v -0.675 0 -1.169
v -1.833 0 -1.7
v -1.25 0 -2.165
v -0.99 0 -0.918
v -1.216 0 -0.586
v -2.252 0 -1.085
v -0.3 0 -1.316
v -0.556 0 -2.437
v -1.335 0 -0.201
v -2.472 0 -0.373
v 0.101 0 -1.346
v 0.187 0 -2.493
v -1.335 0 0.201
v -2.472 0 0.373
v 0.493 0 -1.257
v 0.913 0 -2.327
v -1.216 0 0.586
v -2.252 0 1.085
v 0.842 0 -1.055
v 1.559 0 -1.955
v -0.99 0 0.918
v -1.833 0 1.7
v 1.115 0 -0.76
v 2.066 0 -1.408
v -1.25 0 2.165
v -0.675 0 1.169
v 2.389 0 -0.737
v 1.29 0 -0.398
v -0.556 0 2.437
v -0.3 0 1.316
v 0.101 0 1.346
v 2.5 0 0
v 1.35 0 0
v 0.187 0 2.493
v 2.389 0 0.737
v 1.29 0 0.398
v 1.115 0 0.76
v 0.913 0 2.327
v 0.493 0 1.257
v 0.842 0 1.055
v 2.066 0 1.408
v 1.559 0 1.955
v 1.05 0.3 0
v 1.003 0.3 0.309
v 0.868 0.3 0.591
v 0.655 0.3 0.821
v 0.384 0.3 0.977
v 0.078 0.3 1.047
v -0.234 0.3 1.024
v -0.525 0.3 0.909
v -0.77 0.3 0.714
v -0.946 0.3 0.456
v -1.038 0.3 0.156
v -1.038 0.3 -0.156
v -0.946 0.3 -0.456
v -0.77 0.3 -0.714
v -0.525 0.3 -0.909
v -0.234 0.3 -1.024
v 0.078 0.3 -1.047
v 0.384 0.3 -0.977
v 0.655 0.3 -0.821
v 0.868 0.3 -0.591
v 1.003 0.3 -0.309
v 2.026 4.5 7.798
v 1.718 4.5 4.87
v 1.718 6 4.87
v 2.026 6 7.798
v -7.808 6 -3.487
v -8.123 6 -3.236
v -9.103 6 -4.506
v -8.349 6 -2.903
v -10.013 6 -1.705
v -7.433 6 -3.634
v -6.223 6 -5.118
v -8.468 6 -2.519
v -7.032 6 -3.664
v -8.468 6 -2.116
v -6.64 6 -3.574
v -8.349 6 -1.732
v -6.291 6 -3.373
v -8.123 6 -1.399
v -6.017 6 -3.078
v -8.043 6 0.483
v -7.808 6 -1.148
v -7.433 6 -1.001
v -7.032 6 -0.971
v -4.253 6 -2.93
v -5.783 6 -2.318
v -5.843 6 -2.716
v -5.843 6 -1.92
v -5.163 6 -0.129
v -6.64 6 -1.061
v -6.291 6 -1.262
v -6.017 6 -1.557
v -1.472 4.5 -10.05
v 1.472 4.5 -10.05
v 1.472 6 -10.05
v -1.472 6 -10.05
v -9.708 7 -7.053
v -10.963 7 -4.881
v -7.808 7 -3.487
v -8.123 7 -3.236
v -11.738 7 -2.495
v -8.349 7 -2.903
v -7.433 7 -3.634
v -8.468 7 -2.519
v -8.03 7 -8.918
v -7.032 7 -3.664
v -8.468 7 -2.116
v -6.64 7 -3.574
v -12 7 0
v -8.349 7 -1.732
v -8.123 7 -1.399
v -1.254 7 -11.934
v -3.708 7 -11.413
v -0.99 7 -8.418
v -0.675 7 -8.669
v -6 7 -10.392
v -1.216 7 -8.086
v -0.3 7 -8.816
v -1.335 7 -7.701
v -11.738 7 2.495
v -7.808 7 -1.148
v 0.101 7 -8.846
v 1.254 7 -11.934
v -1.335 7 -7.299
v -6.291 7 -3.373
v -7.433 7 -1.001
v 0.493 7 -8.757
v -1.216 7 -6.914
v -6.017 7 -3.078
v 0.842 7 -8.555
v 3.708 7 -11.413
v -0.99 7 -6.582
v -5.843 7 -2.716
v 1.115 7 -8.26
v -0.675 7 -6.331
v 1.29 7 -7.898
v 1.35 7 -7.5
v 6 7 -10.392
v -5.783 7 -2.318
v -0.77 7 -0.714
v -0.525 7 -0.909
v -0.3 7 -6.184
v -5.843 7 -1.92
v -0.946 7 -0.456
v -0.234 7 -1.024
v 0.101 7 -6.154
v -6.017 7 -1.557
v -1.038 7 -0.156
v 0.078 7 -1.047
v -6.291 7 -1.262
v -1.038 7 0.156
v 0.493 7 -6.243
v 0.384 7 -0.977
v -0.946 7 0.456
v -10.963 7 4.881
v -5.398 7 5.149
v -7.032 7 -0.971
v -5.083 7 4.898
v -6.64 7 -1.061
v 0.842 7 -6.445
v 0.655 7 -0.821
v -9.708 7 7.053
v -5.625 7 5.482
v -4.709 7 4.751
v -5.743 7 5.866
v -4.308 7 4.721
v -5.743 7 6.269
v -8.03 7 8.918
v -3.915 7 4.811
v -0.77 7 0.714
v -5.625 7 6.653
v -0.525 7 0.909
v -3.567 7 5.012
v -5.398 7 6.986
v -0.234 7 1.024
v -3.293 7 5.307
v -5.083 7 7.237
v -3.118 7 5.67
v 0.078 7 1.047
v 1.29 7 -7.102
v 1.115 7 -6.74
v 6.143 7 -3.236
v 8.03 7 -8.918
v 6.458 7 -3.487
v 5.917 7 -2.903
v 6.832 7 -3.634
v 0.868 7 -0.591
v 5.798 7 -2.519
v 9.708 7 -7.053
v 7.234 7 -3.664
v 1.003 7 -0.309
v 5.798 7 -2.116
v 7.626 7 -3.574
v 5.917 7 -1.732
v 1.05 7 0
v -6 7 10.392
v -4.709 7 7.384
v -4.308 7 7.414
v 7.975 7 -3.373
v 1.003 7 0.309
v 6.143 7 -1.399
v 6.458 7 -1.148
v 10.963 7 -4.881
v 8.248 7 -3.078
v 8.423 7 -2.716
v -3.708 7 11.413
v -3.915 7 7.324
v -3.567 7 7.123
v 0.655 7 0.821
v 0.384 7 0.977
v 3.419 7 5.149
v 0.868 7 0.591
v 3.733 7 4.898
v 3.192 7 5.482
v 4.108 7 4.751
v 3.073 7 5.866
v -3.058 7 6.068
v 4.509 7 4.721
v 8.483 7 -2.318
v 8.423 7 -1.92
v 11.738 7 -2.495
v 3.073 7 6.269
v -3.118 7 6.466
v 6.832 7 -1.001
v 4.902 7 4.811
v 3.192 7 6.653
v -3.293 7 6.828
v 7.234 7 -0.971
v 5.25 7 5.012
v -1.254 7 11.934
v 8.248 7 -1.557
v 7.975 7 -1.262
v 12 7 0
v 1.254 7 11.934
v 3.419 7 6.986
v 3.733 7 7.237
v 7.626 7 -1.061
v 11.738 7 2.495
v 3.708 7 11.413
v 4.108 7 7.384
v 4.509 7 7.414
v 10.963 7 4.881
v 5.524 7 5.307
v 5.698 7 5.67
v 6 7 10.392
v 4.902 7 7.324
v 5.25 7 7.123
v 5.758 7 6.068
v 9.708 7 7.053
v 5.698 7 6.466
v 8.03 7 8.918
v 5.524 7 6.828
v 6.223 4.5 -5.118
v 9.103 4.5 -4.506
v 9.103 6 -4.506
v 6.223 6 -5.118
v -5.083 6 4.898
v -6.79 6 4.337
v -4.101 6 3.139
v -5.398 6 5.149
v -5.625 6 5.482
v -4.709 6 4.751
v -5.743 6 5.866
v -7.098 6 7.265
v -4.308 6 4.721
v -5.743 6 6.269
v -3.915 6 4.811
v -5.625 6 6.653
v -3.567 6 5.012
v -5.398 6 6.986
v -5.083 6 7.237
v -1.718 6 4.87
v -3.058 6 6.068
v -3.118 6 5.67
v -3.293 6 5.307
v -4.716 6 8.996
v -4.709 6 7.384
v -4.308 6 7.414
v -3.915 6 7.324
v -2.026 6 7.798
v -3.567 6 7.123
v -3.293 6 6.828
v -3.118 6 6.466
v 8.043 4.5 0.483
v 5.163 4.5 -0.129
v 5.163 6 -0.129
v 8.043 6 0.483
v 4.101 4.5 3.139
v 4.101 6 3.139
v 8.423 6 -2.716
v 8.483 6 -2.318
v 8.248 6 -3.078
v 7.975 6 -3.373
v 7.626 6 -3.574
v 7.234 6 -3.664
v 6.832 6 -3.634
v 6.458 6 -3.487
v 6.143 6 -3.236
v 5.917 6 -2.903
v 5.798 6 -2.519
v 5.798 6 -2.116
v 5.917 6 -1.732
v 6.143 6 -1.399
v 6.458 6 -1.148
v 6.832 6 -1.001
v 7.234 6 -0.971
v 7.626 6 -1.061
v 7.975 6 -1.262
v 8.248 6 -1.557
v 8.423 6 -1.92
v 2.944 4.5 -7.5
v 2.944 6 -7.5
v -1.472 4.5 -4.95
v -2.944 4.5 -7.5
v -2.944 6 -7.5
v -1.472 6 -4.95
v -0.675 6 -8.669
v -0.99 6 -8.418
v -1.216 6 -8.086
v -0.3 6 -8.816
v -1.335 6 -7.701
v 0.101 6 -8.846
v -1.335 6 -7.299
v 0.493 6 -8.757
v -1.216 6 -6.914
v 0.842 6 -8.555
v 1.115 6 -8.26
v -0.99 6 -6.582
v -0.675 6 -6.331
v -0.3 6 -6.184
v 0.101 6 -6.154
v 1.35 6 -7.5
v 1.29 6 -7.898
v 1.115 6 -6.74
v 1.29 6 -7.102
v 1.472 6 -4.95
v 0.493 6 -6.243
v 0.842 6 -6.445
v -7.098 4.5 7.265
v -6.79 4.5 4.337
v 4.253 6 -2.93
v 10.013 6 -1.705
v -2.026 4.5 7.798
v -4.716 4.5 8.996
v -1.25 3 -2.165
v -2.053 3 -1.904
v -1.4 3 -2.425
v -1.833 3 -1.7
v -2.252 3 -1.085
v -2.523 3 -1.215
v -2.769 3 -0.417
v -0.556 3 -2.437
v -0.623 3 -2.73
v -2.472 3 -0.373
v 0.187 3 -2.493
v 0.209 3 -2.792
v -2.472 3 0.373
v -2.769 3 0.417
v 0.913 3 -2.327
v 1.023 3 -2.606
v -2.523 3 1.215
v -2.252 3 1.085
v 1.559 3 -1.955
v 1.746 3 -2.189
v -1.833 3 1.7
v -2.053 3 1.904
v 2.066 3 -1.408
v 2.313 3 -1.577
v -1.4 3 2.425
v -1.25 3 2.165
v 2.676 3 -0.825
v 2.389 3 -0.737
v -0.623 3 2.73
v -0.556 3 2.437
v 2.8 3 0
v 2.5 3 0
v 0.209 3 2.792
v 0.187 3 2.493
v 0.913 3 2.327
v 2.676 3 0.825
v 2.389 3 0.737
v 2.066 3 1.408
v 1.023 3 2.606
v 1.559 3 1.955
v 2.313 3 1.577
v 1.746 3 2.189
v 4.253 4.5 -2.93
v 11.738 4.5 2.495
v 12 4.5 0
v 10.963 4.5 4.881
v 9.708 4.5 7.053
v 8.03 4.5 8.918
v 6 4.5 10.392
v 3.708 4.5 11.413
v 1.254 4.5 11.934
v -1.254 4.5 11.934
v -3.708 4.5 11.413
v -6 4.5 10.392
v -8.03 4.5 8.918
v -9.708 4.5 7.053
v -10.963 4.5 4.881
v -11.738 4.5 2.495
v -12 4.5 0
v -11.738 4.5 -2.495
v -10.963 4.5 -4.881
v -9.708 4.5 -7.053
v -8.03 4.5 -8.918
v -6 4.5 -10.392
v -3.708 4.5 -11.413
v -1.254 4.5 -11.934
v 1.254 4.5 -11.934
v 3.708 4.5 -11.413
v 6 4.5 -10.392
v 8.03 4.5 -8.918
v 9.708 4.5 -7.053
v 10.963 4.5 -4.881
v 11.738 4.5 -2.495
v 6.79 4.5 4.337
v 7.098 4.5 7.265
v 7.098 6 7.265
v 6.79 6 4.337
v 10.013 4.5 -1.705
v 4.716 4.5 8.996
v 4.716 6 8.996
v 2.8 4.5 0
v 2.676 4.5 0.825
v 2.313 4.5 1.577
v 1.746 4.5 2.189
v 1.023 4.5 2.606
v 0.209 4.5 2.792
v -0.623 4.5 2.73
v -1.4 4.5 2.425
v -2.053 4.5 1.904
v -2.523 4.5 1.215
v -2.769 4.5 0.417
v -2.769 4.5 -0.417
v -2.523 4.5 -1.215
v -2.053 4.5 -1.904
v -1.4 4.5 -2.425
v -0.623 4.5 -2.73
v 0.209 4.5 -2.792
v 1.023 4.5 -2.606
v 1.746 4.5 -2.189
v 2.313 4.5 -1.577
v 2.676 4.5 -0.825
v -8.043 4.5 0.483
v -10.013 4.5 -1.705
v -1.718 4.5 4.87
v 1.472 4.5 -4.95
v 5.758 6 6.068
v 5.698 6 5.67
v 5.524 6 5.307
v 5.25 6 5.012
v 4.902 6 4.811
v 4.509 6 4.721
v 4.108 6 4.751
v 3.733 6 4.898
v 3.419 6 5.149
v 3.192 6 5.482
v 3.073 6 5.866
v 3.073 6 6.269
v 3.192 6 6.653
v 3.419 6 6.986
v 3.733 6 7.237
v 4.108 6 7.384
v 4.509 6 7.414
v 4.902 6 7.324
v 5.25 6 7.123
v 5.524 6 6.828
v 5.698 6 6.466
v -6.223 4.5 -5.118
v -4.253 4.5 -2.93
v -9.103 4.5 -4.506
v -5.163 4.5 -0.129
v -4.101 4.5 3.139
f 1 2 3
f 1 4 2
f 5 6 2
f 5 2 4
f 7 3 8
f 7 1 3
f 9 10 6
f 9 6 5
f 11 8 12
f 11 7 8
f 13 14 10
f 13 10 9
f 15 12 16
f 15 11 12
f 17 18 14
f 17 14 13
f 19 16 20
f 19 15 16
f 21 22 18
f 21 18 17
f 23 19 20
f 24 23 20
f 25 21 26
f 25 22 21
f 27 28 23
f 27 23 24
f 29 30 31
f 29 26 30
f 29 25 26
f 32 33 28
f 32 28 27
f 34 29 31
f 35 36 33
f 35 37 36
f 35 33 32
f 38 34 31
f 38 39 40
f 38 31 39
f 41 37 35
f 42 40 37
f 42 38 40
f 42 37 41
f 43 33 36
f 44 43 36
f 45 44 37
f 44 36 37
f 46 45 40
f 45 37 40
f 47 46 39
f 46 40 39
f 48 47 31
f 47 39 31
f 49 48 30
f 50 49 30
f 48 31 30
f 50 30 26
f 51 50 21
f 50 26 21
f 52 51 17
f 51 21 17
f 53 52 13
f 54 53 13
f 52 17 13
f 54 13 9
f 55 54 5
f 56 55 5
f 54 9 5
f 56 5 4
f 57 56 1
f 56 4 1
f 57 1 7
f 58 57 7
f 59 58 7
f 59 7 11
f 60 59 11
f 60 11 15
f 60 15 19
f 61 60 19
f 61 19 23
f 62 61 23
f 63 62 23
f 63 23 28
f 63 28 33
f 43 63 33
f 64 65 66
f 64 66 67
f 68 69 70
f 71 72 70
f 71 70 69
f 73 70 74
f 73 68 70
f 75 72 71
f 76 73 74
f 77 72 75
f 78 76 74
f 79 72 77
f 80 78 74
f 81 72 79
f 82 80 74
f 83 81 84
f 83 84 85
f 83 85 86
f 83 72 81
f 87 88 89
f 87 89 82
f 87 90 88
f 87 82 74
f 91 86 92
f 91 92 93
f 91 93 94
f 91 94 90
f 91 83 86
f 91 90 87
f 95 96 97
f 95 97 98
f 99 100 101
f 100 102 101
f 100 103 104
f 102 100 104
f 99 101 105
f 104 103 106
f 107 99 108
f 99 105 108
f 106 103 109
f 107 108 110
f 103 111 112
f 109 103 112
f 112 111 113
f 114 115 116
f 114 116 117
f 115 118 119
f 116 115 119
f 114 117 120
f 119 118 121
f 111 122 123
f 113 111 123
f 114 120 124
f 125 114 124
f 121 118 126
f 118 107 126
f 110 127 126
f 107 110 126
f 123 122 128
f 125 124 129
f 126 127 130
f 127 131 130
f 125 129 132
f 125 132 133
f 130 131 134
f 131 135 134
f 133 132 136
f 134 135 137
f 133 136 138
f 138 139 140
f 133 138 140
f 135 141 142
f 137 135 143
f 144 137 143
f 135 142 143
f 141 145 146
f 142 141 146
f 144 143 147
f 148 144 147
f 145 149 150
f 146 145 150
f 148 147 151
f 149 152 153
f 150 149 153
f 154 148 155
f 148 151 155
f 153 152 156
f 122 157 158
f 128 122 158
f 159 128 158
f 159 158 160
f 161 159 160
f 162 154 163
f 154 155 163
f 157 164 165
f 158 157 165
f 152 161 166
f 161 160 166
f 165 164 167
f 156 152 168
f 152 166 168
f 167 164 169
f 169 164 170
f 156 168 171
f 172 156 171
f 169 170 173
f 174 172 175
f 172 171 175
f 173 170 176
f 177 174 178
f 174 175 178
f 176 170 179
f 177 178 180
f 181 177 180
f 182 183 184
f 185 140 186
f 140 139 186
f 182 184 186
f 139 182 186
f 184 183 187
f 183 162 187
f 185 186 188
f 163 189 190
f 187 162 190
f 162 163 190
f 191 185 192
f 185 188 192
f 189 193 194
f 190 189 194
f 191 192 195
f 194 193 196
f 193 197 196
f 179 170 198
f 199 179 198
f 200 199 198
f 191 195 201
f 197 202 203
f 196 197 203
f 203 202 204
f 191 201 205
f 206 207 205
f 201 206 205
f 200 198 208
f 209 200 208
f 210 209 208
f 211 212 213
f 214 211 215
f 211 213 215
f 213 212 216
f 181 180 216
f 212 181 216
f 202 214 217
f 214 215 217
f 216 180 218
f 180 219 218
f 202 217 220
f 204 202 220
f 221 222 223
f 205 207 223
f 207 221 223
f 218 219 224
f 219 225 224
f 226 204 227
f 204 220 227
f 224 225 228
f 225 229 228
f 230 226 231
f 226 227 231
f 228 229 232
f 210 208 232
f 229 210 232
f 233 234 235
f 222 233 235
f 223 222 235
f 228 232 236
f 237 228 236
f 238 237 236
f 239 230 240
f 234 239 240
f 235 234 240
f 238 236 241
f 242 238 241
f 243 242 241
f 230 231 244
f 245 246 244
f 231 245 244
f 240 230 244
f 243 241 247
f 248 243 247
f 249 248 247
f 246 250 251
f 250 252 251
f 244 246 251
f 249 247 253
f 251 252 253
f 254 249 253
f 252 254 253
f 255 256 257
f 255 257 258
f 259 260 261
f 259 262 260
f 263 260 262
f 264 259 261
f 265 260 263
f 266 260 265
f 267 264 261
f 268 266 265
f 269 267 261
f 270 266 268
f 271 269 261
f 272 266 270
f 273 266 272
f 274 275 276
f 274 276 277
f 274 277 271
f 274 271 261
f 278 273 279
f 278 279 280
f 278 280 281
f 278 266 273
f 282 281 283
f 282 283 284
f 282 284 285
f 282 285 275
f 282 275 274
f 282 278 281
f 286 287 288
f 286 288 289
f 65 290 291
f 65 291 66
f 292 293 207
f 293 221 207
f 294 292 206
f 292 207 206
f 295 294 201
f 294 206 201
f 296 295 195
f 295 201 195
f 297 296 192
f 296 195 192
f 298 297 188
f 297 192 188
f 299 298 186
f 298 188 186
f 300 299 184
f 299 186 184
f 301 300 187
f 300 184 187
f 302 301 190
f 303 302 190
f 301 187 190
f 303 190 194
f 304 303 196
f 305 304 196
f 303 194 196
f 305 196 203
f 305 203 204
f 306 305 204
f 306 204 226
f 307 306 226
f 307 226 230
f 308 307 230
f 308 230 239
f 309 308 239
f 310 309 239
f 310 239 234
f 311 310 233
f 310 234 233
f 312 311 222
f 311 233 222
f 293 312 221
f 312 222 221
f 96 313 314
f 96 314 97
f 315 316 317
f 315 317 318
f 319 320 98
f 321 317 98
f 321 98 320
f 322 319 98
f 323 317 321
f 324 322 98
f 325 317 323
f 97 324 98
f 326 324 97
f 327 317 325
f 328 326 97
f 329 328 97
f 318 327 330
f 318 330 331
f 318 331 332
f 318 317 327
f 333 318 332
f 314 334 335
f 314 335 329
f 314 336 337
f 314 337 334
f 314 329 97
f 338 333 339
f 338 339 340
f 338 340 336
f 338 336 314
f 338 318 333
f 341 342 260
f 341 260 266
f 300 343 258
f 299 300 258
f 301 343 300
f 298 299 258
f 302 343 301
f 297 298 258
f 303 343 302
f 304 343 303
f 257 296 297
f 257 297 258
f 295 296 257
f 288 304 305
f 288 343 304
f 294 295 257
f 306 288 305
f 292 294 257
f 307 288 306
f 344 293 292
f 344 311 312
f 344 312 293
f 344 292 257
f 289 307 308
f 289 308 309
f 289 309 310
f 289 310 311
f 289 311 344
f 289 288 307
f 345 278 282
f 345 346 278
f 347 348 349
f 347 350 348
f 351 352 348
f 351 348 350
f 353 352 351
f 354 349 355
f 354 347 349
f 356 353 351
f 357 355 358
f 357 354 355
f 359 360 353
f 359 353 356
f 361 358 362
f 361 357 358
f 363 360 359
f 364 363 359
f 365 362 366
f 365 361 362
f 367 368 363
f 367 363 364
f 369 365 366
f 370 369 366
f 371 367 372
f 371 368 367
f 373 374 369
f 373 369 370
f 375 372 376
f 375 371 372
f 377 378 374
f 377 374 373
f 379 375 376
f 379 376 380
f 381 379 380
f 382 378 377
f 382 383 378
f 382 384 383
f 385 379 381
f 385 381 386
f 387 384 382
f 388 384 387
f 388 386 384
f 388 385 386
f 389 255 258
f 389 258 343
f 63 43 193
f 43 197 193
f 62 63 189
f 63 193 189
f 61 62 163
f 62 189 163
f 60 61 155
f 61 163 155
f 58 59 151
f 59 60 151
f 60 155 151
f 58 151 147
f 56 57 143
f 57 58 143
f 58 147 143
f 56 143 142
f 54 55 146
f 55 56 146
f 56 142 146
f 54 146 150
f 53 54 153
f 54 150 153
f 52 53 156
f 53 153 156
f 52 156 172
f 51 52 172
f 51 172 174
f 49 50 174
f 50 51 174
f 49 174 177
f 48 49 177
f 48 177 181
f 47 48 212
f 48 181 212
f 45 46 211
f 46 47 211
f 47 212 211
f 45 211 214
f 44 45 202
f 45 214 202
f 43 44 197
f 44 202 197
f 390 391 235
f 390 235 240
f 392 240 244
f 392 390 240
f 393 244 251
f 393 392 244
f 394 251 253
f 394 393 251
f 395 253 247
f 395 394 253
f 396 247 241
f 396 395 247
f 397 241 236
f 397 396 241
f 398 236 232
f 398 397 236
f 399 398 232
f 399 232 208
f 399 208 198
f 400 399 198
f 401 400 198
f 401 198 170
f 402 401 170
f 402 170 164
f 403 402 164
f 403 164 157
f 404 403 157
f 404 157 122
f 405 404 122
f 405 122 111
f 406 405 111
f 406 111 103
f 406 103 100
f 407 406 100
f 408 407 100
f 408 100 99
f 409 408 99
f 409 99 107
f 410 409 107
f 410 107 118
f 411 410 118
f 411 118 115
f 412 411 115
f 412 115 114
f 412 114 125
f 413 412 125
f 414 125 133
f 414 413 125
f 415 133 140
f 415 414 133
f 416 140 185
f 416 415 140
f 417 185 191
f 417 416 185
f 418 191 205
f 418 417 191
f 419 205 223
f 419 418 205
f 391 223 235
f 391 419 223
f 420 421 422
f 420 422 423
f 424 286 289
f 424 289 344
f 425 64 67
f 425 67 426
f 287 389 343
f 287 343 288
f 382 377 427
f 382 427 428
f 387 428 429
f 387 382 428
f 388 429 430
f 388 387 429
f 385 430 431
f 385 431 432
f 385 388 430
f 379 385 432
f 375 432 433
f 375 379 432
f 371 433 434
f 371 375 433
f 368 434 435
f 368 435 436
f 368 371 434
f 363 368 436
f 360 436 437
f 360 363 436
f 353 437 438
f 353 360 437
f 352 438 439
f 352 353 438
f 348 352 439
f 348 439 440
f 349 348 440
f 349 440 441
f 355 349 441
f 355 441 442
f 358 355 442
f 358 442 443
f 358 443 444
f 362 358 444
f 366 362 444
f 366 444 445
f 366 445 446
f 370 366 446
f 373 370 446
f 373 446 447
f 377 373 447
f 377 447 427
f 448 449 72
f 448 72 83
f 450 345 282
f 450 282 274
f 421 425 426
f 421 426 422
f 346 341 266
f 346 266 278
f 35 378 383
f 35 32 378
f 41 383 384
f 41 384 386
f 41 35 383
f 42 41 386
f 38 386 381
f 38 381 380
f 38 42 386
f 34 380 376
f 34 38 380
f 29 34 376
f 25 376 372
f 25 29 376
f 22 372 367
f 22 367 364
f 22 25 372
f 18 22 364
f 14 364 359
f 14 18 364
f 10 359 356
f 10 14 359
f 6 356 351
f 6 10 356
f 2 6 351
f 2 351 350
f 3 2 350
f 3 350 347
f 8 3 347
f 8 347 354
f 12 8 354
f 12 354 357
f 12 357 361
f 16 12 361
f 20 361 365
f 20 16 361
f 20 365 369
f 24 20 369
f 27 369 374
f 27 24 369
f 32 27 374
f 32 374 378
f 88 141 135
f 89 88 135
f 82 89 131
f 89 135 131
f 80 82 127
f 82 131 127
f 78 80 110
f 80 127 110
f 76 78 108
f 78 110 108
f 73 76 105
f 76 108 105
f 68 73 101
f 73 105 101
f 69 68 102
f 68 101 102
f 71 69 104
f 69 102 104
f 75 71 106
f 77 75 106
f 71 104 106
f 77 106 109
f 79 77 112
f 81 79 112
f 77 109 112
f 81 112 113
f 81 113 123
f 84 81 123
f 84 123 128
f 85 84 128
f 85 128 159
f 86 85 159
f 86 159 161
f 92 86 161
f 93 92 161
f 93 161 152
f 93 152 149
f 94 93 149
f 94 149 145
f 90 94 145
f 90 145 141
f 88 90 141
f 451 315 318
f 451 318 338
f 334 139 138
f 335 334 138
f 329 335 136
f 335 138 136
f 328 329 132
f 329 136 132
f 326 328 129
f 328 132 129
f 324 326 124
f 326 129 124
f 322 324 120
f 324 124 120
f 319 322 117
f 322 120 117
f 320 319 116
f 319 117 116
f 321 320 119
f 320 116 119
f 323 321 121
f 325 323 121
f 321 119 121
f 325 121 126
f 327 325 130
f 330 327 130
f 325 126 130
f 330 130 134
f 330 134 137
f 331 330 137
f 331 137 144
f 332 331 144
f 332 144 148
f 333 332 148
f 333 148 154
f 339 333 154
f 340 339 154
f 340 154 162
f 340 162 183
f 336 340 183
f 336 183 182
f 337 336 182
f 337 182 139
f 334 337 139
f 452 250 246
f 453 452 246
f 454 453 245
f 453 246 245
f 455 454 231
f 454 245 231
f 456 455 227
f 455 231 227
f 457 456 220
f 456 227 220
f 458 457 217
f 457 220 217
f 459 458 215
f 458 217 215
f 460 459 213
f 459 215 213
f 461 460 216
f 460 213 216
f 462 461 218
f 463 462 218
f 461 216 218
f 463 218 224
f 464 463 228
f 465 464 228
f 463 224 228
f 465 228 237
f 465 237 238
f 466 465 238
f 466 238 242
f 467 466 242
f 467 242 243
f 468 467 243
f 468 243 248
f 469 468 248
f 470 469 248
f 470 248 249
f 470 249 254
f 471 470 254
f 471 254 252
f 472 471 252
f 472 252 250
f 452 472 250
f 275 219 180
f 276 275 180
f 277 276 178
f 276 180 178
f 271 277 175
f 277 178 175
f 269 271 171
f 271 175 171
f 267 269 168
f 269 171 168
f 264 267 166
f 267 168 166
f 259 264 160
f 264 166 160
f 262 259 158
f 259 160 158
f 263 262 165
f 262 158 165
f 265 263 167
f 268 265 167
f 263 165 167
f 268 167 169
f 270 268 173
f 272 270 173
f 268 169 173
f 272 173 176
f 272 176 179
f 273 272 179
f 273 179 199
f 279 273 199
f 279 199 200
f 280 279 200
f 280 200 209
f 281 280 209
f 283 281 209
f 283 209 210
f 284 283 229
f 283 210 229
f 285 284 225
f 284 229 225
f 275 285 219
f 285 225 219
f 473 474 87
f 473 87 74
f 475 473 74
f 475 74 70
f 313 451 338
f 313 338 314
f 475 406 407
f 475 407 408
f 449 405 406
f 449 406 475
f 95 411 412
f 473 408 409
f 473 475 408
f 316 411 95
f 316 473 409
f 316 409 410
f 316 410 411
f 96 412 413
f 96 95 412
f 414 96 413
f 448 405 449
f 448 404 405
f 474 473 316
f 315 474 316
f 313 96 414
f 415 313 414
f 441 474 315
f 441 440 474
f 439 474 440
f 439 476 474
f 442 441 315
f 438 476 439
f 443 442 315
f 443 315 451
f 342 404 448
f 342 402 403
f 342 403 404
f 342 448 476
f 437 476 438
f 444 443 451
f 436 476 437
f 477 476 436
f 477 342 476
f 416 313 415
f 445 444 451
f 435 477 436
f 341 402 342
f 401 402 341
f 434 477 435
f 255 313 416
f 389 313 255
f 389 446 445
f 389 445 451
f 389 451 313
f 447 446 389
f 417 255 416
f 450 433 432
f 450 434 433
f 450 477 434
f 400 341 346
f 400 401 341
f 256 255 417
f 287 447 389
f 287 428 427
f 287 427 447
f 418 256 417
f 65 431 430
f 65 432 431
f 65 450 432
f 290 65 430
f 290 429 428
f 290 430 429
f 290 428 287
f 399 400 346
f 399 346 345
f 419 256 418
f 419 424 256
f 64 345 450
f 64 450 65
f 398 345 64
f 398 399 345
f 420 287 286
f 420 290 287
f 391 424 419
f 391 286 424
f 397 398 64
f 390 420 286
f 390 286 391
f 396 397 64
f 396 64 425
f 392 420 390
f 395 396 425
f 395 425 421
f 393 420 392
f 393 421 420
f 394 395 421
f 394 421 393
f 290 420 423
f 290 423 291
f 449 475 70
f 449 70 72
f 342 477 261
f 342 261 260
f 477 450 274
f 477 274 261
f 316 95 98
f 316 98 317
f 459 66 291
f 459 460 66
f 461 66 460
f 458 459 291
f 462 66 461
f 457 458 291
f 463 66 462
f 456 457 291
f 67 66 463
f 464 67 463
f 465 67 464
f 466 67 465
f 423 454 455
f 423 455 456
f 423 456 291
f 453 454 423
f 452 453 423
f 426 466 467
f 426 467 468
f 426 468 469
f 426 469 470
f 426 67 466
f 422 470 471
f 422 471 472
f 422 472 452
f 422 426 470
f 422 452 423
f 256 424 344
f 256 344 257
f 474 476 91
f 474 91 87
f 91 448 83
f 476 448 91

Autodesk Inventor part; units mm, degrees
ref_plane "YZ Plane" through (0, 0, 0) normal (1, 0, 0) x (0, 1, 0)
ref_plane "XZ Plane" through (0, 0, 0) normal (0, 1, 0) x (-1, 0, 0)
ref_plane "XY Plane" through (0, 0, 0) normal (0, 0, 1) x (1, 0, 0)
sketch "Sketch1" plane through (0, 0, 0) normal (0, 0, 1) x (1, 0, 0)
  line L0 (0, 7) -> (0, 0) construction
  line L1 (0, 0) -> (1.05, 0) construction
  line L2 (1.05, 0) -> (1.05, 7)
  line L3 (1.05, 7) -> (0, 7) construction
  line L4 (1.05, 7) -> (12, 7)
  line L5 (2.8, 3) -> (2.5, 3)
  line L6 (2.5, 3) -> (2.5, 0)
  line L7 (2.5, 0) -> (1.05, 0)
  line L8 (12, 7) -> (12, 4.5)
  line L9 (12, 4.5) -> (2.8, 4.5)
  line L10 (2.8, 4.5) -> (2.8, 3)
  dimension "d0" = 2.5
  dimension "d1" = 1.05
  dimension "d3" = 0.3
  dimension "d4" = 3
  dimension "d9" = 1.5
  dimension "d10" = 12
  dimension "d11" = 2.5
revolve "Revolution1" add sketch "Sketch1" angle 360 about axis through (0, 7, 0) along (0, -1, 0)
sketch "Sketch2" plane through (0, 7, 0) normal (0, 1, 0) x (1, 0, 0)
  line L0 (0, 0) -> (0, 7.5) construction
  circle A0 centre (0, 7.5) radius 1.35
  line L1 (0, 0) -> (-7.1329, 2.3176) construction
  circle A1 centre (-7.1329, 2.3176) radius 1.35
  line L2 (0, 0) -> (-4.4084, -6.0676) construction
  circle A2 centre (-4.4084, -6.0676) radius 1.35
  line L3 (0, 0) -> (4.4084, -6.0676) construction
  circle A3 centre (4.4084, -6.0676) radius 1.35
  line L4 (0, 0) -> (7.1329, 2.3176) construction
  circle A4 centre (7.1329, 2.3176) radius 1.35
  dimension "d12" = 7.5
  dimension "d13" = 2.7
  dimension "d16" = 360
extrude "Extrusion1" cut sketch "Sketch2" against normal blind 10
sketch "Sketch3" plane through (0, 4.5, 0) normal (0, -1, 0) x (1, 0, 0)
  circle A0 centre (0, -7.5) radius 1.35 construction
  line L0 (-2.9445, -7.5) -> (-1.4722, -4.95)
  line L1 (-1.4722, -4.95) -> (1.4722, -4.95)
  line L2 (1.4722, -4.95) -> (2.9445, -7.5)
  line L3 (2.9445, -7.5) -> (1.4722, -10.05)
  line L4 (1.4722, -10.05) -> (-1.4722, -10.05)
  line L5 (-1.4722, -10.05) -> (-2.9445, -7.5)
  line L6 (6.223, -5.118) -> (4.2528, -2.9298)
  line L7 (4.2528, -2.9298) -> (5.1627, -0.1294)
  line L8 (5.1627, -0.1294) -> (8.0428, 0.4827)
  line L9 (8.0428, 0.4827) -> (10.0131, -1.7054)
  line L10 (10.0131, -1.7054) -> (9.1032, -4.5058)
  line L11 (9.1032, -4.5058) -> (6.223, -5.118)
  line L12 (6.7905, 4.3369) -> (4.1006, 3.1393)
  line L13 (4.1006, 3.1393) -> (1.7185, 4.87)
  line L14 (1.7185, 4.87) -> (2.0262, 7.7984)
  line L15 (2.0262, 7.7984) -> (4.7162, 8.996)
  line L16 (4.7162, 8.996) -> (7.0983, 7.2653)
  line L17 (7.0983, 7.2653) -> (6.7905, 4.3369)
  line L18 (-2.0262, 7.7984) -> (-1.7185, 4.87)
  line L19 (-1.7185, 4.87) -> (-4.1006, 3.1393)
  line L20 (-4.1006, 3.1393) -> (-6.7905, 4.3369)
  line L21 (-6.7905, 4.3369) -> (-7.0983, 7.2653)
  line L22 (-7.0983, 7.2653) -> (-4.7162, 8.996)
  line L23 (-4.7162, 8.996) -> (-2.0262, 7.7984)
  line L24 (-8.0428, 0.4827) -> (-5.1627, -0.1294)
  line L25 (-5.1627, -0.1294) -> (-4.2528, -2.9298)
  line L26 (-4.2528, -2.9298) -> (-6.223, -5.118)
  line L27 (-6.223, -5.118) -> (-9.1032, -4.5058)
  line L28 (-9.1032, -4.5058) -> (-10.0131, -1.7054)
  line L29 (-10.0131, -1.7054) -> (-8.0428, 0.4827)
  point P0 (0, 0)
  point P1 (0, -7.5)
  point P2 (7.1329, -2.3176)
  point P3 (7.1329, -2.3176)
  point P4 (4.4084, 6.0676)
  point P5 (4.4084, 6.0676)
  point P6 (-4.4084, 6.0676)
  point P7 (-4.4084, 6.0676)
  point P8 (-7.1329, -2.3176)
  point P9 (-7.1329, -2.3176)
  dimension "d20" = 5.1
  dimension "d23" = 360
extrude "Extrusion2" cut sketch "Sketch3" against normal blind 1.5
chamfer "Chamfer2" distance 0.3 angle 45 1 edges at (-1.05, 0, 0)
properties part number "Flywheel"
